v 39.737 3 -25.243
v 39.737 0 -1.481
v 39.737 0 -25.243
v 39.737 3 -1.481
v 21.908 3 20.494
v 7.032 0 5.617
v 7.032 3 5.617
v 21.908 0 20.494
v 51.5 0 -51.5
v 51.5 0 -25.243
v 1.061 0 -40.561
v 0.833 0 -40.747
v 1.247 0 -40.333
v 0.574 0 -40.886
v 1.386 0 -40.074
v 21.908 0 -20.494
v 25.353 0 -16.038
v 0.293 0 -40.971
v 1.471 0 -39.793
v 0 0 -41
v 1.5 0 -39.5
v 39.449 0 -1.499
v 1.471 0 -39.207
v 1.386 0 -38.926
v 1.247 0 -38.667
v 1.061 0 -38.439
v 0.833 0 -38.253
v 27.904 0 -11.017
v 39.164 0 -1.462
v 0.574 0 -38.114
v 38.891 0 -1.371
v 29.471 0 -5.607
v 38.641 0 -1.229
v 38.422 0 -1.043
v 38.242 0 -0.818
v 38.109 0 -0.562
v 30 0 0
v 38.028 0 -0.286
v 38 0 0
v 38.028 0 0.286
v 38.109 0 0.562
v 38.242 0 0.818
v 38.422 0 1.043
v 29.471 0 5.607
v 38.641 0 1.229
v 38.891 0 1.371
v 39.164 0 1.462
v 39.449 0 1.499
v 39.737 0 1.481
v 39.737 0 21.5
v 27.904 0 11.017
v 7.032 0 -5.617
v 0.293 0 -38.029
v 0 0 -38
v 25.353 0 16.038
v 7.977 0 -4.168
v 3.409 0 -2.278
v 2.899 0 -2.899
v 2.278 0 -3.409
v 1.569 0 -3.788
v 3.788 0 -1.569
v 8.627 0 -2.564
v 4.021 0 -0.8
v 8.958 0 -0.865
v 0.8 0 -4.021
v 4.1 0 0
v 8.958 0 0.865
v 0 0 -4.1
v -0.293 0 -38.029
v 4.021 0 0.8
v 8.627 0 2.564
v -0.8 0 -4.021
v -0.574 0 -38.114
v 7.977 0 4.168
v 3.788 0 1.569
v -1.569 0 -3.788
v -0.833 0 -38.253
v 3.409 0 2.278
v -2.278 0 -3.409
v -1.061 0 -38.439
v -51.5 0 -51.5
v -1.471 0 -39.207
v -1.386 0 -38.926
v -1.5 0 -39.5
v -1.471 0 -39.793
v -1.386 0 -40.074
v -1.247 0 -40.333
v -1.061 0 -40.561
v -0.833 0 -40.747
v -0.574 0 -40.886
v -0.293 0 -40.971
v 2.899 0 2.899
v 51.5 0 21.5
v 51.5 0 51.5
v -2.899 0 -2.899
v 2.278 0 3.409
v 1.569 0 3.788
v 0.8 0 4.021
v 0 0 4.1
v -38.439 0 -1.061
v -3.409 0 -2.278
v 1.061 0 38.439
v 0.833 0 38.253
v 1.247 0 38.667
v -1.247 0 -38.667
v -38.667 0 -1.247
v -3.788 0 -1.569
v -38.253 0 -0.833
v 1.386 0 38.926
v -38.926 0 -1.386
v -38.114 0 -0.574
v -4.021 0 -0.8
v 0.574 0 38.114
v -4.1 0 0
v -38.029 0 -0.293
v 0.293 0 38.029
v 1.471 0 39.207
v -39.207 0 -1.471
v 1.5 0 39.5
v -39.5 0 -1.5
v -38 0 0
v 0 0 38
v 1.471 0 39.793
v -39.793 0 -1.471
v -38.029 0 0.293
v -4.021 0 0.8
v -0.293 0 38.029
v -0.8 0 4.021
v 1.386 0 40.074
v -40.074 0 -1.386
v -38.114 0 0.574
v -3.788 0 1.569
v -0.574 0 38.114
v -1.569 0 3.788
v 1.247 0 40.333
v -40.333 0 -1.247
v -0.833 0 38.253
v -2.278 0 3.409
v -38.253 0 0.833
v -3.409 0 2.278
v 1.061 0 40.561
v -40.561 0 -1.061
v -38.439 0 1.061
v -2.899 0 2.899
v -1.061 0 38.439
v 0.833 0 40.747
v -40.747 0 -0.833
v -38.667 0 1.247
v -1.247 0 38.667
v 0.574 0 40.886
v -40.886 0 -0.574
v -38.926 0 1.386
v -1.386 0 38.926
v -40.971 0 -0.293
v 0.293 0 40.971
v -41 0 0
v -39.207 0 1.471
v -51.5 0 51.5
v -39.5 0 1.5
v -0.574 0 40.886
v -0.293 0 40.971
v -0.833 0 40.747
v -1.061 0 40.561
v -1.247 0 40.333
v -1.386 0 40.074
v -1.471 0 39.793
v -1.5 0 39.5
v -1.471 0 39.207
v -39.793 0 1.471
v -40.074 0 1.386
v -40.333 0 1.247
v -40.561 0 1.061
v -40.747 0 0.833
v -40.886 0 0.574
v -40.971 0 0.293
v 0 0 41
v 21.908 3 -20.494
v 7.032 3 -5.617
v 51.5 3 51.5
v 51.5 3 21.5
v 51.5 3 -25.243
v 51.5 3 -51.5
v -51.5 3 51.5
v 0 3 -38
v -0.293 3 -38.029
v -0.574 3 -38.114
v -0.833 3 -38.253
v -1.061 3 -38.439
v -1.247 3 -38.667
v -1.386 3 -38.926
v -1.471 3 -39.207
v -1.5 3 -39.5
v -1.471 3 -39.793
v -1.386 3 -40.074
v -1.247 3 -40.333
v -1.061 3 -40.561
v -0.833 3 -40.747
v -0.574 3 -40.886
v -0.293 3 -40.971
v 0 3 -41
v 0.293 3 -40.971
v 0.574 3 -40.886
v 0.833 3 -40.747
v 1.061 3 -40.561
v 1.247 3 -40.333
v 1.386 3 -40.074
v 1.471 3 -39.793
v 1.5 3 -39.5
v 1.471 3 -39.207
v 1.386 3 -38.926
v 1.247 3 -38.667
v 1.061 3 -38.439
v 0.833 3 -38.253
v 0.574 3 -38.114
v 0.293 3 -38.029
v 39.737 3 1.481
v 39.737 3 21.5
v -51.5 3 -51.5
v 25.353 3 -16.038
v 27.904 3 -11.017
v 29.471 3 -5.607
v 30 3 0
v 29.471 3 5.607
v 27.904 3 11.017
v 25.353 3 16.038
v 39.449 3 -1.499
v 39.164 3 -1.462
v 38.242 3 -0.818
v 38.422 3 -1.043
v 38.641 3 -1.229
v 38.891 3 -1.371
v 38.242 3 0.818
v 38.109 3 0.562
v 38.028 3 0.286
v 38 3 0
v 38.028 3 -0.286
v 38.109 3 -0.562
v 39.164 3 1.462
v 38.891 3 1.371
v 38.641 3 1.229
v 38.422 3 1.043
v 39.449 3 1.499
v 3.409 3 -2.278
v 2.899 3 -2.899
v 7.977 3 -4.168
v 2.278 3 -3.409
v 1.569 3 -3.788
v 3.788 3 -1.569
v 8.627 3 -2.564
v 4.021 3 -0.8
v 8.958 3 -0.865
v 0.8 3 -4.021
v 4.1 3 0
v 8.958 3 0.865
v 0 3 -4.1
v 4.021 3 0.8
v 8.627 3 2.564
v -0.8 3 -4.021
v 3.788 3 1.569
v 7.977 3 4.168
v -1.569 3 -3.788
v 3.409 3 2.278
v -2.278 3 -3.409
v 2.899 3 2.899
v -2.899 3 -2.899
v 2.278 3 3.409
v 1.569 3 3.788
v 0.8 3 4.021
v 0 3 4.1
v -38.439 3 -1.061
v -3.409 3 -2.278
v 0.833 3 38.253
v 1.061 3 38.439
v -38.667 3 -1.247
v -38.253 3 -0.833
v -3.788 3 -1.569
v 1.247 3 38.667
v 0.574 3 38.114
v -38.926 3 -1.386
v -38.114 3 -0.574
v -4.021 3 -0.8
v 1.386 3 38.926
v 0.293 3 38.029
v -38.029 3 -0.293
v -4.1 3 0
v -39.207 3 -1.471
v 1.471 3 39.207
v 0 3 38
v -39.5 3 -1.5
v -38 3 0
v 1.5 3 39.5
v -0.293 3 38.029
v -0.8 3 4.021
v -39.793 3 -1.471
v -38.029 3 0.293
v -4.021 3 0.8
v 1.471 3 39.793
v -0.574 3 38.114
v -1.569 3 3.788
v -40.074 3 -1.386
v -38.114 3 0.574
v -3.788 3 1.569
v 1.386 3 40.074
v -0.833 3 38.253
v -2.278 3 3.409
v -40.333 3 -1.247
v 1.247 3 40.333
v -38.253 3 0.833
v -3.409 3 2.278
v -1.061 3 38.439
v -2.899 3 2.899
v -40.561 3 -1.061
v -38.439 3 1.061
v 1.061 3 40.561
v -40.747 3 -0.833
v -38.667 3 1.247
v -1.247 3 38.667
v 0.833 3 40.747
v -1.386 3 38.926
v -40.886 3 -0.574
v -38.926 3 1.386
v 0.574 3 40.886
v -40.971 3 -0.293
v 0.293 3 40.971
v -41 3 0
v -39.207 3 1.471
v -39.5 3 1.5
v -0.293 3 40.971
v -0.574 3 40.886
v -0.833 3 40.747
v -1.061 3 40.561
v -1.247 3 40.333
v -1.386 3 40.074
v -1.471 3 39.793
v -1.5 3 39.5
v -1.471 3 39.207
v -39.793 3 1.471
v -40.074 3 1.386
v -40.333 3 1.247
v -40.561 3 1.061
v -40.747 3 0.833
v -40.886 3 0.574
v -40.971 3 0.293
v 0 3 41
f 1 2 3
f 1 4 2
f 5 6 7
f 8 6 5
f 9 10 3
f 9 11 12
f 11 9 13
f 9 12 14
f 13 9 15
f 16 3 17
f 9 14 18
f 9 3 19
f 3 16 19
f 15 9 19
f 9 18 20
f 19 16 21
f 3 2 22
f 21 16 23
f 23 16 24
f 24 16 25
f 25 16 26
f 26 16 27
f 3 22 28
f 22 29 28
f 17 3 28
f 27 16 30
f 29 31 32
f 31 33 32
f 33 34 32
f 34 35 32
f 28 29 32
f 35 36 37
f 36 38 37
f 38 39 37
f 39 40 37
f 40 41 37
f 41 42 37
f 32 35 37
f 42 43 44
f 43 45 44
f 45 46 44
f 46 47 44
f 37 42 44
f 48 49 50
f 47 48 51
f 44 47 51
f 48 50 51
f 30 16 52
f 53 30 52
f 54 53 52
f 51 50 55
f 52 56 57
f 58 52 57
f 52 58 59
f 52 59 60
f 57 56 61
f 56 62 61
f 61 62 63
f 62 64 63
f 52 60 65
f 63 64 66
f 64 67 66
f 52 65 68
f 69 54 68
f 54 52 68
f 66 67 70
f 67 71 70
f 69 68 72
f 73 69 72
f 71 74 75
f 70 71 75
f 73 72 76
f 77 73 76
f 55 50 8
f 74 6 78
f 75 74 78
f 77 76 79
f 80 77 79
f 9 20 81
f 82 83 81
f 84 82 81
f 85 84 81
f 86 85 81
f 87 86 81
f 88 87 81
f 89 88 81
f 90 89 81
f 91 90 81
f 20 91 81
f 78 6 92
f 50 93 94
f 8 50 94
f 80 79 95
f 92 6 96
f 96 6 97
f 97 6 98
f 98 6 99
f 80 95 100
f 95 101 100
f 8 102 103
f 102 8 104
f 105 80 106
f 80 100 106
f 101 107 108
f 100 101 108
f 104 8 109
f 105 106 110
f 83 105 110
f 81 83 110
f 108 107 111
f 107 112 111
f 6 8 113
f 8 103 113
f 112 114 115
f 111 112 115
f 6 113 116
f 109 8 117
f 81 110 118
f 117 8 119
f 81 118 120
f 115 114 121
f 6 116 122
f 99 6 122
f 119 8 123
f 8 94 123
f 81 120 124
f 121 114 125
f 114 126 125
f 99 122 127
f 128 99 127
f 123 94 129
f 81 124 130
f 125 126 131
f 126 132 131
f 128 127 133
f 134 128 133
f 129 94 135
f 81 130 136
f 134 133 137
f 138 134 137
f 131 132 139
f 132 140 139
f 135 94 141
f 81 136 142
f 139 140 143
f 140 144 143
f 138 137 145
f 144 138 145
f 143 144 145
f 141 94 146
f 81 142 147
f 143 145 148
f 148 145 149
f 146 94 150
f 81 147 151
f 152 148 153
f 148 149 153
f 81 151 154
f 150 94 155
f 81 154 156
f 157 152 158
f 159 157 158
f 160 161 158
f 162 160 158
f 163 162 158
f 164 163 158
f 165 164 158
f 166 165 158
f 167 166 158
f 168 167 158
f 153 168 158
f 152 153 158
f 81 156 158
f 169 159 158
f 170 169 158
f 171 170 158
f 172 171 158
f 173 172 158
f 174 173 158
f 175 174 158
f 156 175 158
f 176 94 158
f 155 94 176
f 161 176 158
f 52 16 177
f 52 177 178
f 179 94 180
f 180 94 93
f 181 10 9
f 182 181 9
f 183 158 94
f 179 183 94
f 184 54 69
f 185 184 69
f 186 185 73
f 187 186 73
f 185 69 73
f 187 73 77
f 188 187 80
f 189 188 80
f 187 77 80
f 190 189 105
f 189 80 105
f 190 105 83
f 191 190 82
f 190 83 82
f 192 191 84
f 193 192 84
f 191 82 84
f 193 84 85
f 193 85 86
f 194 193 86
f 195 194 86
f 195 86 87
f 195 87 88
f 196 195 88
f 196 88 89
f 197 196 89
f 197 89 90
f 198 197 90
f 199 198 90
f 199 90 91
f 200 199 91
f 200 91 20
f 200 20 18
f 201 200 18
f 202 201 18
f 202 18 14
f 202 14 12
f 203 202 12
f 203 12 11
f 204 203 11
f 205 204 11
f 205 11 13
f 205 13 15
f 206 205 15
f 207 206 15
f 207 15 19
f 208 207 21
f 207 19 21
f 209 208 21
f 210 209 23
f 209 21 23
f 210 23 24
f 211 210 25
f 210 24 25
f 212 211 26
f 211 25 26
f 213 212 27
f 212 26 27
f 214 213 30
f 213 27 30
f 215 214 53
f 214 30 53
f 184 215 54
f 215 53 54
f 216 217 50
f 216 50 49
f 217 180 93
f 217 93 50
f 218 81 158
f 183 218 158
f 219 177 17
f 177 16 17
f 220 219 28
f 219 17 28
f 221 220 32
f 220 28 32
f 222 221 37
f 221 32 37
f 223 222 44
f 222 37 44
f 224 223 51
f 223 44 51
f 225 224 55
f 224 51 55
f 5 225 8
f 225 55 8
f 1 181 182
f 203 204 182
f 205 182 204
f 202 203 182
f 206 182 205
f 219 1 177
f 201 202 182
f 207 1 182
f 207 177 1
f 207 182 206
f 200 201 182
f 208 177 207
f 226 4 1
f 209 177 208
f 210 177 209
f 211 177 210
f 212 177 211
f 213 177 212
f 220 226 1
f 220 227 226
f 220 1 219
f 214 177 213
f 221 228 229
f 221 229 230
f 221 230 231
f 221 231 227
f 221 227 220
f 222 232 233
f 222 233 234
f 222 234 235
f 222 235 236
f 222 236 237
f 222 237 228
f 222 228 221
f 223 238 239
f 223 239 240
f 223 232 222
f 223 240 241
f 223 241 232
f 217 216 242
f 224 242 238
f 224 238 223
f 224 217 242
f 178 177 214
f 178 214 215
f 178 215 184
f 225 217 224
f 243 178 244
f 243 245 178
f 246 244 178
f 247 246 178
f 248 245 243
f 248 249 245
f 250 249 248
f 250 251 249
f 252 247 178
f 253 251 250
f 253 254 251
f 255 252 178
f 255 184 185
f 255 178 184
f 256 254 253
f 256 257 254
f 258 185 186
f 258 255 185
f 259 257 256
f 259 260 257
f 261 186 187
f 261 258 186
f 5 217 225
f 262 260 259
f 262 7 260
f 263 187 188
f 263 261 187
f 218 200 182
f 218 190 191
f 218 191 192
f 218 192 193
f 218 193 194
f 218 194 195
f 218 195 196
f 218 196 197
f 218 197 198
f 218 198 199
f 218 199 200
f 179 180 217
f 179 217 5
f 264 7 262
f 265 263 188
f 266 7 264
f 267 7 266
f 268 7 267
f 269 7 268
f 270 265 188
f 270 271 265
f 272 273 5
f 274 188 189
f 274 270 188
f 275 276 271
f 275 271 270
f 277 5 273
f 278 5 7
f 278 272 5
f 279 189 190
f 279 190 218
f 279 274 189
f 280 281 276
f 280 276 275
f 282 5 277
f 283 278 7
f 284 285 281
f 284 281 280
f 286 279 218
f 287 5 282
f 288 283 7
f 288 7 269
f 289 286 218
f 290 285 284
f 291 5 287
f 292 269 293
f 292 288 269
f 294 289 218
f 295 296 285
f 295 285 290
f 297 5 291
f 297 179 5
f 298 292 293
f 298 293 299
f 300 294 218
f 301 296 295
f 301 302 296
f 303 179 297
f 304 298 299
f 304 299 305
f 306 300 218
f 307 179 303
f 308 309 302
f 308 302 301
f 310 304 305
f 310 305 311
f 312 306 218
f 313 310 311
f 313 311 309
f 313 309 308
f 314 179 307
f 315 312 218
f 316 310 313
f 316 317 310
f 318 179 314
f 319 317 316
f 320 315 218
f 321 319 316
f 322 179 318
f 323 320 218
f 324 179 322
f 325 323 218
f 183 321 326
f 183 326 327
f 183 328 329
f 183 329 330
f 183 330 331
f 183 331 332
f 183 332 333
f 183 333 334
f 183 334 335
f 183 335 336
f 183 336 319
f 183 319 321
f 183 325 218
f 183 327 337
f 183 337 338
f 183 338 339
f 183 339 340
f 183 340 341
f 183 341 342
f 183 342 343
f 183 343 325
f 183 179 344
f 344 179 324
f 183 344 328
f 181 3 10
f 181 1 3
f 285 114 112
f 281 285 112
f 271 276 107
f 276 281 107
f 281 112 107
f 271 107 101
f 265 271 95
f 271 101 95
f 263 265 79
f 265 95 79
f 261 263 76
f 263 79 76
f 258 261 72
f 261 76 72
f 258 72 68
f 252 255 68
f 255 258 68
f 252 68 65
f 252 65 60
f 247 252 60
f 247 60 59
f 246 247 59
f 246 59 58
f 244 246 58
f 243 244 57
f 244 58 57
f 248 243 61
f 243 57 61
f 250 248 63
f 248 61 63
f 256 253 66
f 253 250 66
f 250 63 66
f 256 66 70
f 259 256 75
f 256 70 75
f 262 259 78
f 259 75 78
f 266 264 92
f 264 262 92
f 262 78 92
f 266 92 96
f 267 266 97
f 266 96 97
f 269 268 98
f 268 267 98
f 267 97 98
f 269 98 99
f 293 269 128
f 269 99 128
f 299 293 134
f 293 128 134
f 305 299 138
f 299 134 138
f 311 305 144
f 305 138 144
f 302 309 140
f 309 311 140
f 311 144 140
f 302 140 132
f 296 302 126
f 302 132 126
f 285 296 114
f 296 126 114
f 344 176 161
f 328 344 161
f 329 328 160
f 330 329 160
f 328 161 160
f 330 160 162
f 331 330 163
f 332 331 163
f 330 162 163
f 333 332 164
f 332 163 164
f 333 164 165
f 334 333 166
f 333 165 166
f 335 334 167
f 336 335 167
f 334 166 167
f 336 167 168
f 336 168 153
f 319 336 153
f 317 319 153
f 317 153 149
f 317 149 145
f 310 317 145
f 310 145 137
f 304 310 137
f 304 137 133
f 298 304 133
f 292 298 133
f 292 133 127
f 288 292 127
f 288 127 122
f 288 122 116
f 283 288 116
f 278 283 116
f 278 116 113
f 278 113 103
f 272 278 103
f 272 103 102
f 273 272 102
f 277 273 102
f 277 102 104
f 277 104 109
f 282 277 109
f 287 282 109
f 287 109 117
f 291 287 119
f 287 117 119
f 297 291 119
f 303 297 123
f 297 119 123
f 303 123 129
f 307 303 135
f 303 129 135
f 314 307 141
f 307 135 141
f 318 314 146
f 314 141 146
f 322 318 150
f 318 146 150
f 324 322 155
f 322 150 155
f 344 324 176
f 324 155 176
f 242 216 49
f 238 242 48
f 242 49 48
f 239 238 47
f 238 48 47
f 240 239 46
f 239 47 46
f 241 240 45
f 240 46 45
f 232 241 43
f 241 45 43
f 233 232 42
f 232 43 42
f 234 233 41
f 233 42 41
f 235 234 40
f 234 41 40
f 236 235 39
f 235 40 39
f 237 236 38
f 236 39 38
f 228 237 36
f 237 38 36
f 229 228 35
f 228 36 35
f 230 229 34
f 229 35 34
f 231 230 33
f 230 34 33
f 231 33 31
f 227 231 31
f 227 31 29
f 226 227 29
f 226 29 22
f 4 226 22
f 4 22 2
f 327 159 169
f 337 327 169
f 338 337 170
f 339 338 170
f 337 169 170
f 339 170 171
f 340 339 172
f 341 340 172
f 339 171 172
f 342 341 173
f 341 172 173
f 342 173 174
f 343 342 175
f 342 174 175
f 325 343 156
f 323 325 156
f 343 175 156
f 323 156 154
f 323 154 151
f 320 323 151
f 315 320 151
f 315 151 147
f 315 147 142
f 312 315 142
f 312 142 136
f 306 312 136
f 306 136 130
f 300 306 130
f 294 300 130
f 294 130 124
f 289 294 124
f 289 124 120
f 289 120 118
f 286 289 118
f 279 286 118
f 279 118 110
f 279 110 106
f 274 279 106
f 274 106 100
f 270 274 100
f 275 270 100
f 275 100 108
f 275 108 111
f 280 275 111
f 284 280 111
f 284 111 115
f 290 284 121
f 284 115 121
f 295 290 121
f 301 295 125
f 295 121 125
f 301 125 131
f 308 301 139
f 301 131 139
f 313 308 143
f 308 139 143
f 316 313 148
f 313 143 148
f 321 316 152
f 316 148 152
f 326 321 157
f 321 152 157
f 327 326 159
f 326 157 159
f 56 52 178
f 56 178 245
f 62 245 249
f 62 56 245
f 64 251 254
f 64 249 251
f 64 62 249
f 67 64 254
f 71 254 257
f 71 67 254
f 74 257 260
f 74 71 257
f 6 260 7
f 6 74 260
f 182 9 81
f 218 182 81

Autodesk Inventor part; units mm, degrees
ref_plane "YZ Plane" through (0, 0, 0) normal (1, 0, 0) x (0, 1, 0)
ref_plane "XZ Plane" through (0, 0, 0) normal (0, 1, 0) x (-1, 0, 0)
ref_plane "XY Plane" through (0, 0, 0) normal (0, 0, 1) x (1, 0, 0)
sketch "Boceto6" plane through (0, 0, 0) normal (0, 1, 0) x (-1, 0, 0)
  line L0 (-51.5, -51.5) -> (51.5, -51.5)
  line L1 (51.5, -51.5) -> (51.5, 51.5)
  line L2 (51.5, 51.5) -> (-51.5, 51.5)
  line L3 (-51.5, 51.5) -> (-51.5, -51.5)
  line L4 (-53.9142, 52.5) -> (52.5, 52.5)
  line L5 (52.5, 52.5) -> (52.5, -53.9142)
  line L6 (52.5, 53.9142) -> (52.5, -52.5)
  line L7 (52.5, -52.5) -> (-53.9142, -52.5)
  arc A0 (-21.9085, 20.4943) -> (-21.9085, -20.4943) centre (0, 0) ccw
  line L8 (-53.9142, -52.5) -> (-51.5, -50.0858)
  line L9 (-21.9085, -20.4943) -> (-7.0317, -5.6174)
  line L10 (-7.0317, 5.6174) -> (-21.9085, 20.4943)
  line L11 (-51.5, 50.0858) -> (-53.9142, 52.5)
  circle A1 centre (0, 0) radius 4.1
  arc A2 (-7.0317, 5.6174) -> (-7.0317, -5.6174) centre (0, 0) ccw
  dimension "d32" = 103
  dimension "d33" = 103
  dimension "d39" = 8.2
  dimension "d49" = 18
extrude "Extrusión4" add sketch "Boceto6" along normal blind 3 contours L3 L2 L1 L0
sketch "Boceto7" plane through (0, 3, 0) normal (0, 1, 0) x (1, 0, 0)
  circle A0 centre (39.5, 0) radius 1.5 projected
  circle A1 centre (0, 39.5) radius 1.5 projected
  line L0 (51.5, -51.5) -> (51.5, 51.5) projected
  line L1 (-51.5, -51.5) -> (51.5, -51.5) projected
  line L2 (-51.5, 51.5) -> (-51.5, -51.5) projected
  line L3 (51.5, 51.5) -> (-51.5, 51.5) projected
  arc A2 (-5.9631, 4.5488) -> (-5.9631, -4.5488) centre (0, 0) ccw projected
  line L4 (-21.9085, 20.4943) -> (-5.9631, 4.5488) projected
  arc A3 (-21.9085, 20.4943) -> (-21.9085, -20.4943) centre (0, 0) ccw projected
  line L5 (-5.9631, -4.5488) -> (-21.9085, -20.4943) projected
  circle A4 centre (-39.5, 0) radius 1.5 projected
  circle A5 centre (0, -39.5) radius 1.5 projected
  point P0 (0, 0)
hole "Agujero3" at (39.5, 3, 0) at (0, 3, -39.5) at (-39.5, 3, 0) at (0, 3, 39.5) direction (0, -1, 0) diameter 3 end through all
sketch "Boceto8" plane through (0, 3, 0) normal (0, 1, 0) x (1, 0, 0)
  line L0 (51.5, -51.5) -> (51.5, -21.5)
  line L1 (51.5, -51.5) -> (51.5, 51.5) projected
  line L2 (51.5, -21.5) -> (39.7367, -21.5)
  line L3 (39.7367, -21.5) -> (39.7367, 25.2431)
  line L4 (39.7367, 25.2431) -> (51.5, 25.2431)
  line L5 (51.5, 25.2431) -> (51.5, -21.5)
  point P0 (0, 0)
  dimension "d50" = 30
extrude "Extrusión5" cut sketch "Boceto8" against normal blind 10
properties part number "Plataforma"
